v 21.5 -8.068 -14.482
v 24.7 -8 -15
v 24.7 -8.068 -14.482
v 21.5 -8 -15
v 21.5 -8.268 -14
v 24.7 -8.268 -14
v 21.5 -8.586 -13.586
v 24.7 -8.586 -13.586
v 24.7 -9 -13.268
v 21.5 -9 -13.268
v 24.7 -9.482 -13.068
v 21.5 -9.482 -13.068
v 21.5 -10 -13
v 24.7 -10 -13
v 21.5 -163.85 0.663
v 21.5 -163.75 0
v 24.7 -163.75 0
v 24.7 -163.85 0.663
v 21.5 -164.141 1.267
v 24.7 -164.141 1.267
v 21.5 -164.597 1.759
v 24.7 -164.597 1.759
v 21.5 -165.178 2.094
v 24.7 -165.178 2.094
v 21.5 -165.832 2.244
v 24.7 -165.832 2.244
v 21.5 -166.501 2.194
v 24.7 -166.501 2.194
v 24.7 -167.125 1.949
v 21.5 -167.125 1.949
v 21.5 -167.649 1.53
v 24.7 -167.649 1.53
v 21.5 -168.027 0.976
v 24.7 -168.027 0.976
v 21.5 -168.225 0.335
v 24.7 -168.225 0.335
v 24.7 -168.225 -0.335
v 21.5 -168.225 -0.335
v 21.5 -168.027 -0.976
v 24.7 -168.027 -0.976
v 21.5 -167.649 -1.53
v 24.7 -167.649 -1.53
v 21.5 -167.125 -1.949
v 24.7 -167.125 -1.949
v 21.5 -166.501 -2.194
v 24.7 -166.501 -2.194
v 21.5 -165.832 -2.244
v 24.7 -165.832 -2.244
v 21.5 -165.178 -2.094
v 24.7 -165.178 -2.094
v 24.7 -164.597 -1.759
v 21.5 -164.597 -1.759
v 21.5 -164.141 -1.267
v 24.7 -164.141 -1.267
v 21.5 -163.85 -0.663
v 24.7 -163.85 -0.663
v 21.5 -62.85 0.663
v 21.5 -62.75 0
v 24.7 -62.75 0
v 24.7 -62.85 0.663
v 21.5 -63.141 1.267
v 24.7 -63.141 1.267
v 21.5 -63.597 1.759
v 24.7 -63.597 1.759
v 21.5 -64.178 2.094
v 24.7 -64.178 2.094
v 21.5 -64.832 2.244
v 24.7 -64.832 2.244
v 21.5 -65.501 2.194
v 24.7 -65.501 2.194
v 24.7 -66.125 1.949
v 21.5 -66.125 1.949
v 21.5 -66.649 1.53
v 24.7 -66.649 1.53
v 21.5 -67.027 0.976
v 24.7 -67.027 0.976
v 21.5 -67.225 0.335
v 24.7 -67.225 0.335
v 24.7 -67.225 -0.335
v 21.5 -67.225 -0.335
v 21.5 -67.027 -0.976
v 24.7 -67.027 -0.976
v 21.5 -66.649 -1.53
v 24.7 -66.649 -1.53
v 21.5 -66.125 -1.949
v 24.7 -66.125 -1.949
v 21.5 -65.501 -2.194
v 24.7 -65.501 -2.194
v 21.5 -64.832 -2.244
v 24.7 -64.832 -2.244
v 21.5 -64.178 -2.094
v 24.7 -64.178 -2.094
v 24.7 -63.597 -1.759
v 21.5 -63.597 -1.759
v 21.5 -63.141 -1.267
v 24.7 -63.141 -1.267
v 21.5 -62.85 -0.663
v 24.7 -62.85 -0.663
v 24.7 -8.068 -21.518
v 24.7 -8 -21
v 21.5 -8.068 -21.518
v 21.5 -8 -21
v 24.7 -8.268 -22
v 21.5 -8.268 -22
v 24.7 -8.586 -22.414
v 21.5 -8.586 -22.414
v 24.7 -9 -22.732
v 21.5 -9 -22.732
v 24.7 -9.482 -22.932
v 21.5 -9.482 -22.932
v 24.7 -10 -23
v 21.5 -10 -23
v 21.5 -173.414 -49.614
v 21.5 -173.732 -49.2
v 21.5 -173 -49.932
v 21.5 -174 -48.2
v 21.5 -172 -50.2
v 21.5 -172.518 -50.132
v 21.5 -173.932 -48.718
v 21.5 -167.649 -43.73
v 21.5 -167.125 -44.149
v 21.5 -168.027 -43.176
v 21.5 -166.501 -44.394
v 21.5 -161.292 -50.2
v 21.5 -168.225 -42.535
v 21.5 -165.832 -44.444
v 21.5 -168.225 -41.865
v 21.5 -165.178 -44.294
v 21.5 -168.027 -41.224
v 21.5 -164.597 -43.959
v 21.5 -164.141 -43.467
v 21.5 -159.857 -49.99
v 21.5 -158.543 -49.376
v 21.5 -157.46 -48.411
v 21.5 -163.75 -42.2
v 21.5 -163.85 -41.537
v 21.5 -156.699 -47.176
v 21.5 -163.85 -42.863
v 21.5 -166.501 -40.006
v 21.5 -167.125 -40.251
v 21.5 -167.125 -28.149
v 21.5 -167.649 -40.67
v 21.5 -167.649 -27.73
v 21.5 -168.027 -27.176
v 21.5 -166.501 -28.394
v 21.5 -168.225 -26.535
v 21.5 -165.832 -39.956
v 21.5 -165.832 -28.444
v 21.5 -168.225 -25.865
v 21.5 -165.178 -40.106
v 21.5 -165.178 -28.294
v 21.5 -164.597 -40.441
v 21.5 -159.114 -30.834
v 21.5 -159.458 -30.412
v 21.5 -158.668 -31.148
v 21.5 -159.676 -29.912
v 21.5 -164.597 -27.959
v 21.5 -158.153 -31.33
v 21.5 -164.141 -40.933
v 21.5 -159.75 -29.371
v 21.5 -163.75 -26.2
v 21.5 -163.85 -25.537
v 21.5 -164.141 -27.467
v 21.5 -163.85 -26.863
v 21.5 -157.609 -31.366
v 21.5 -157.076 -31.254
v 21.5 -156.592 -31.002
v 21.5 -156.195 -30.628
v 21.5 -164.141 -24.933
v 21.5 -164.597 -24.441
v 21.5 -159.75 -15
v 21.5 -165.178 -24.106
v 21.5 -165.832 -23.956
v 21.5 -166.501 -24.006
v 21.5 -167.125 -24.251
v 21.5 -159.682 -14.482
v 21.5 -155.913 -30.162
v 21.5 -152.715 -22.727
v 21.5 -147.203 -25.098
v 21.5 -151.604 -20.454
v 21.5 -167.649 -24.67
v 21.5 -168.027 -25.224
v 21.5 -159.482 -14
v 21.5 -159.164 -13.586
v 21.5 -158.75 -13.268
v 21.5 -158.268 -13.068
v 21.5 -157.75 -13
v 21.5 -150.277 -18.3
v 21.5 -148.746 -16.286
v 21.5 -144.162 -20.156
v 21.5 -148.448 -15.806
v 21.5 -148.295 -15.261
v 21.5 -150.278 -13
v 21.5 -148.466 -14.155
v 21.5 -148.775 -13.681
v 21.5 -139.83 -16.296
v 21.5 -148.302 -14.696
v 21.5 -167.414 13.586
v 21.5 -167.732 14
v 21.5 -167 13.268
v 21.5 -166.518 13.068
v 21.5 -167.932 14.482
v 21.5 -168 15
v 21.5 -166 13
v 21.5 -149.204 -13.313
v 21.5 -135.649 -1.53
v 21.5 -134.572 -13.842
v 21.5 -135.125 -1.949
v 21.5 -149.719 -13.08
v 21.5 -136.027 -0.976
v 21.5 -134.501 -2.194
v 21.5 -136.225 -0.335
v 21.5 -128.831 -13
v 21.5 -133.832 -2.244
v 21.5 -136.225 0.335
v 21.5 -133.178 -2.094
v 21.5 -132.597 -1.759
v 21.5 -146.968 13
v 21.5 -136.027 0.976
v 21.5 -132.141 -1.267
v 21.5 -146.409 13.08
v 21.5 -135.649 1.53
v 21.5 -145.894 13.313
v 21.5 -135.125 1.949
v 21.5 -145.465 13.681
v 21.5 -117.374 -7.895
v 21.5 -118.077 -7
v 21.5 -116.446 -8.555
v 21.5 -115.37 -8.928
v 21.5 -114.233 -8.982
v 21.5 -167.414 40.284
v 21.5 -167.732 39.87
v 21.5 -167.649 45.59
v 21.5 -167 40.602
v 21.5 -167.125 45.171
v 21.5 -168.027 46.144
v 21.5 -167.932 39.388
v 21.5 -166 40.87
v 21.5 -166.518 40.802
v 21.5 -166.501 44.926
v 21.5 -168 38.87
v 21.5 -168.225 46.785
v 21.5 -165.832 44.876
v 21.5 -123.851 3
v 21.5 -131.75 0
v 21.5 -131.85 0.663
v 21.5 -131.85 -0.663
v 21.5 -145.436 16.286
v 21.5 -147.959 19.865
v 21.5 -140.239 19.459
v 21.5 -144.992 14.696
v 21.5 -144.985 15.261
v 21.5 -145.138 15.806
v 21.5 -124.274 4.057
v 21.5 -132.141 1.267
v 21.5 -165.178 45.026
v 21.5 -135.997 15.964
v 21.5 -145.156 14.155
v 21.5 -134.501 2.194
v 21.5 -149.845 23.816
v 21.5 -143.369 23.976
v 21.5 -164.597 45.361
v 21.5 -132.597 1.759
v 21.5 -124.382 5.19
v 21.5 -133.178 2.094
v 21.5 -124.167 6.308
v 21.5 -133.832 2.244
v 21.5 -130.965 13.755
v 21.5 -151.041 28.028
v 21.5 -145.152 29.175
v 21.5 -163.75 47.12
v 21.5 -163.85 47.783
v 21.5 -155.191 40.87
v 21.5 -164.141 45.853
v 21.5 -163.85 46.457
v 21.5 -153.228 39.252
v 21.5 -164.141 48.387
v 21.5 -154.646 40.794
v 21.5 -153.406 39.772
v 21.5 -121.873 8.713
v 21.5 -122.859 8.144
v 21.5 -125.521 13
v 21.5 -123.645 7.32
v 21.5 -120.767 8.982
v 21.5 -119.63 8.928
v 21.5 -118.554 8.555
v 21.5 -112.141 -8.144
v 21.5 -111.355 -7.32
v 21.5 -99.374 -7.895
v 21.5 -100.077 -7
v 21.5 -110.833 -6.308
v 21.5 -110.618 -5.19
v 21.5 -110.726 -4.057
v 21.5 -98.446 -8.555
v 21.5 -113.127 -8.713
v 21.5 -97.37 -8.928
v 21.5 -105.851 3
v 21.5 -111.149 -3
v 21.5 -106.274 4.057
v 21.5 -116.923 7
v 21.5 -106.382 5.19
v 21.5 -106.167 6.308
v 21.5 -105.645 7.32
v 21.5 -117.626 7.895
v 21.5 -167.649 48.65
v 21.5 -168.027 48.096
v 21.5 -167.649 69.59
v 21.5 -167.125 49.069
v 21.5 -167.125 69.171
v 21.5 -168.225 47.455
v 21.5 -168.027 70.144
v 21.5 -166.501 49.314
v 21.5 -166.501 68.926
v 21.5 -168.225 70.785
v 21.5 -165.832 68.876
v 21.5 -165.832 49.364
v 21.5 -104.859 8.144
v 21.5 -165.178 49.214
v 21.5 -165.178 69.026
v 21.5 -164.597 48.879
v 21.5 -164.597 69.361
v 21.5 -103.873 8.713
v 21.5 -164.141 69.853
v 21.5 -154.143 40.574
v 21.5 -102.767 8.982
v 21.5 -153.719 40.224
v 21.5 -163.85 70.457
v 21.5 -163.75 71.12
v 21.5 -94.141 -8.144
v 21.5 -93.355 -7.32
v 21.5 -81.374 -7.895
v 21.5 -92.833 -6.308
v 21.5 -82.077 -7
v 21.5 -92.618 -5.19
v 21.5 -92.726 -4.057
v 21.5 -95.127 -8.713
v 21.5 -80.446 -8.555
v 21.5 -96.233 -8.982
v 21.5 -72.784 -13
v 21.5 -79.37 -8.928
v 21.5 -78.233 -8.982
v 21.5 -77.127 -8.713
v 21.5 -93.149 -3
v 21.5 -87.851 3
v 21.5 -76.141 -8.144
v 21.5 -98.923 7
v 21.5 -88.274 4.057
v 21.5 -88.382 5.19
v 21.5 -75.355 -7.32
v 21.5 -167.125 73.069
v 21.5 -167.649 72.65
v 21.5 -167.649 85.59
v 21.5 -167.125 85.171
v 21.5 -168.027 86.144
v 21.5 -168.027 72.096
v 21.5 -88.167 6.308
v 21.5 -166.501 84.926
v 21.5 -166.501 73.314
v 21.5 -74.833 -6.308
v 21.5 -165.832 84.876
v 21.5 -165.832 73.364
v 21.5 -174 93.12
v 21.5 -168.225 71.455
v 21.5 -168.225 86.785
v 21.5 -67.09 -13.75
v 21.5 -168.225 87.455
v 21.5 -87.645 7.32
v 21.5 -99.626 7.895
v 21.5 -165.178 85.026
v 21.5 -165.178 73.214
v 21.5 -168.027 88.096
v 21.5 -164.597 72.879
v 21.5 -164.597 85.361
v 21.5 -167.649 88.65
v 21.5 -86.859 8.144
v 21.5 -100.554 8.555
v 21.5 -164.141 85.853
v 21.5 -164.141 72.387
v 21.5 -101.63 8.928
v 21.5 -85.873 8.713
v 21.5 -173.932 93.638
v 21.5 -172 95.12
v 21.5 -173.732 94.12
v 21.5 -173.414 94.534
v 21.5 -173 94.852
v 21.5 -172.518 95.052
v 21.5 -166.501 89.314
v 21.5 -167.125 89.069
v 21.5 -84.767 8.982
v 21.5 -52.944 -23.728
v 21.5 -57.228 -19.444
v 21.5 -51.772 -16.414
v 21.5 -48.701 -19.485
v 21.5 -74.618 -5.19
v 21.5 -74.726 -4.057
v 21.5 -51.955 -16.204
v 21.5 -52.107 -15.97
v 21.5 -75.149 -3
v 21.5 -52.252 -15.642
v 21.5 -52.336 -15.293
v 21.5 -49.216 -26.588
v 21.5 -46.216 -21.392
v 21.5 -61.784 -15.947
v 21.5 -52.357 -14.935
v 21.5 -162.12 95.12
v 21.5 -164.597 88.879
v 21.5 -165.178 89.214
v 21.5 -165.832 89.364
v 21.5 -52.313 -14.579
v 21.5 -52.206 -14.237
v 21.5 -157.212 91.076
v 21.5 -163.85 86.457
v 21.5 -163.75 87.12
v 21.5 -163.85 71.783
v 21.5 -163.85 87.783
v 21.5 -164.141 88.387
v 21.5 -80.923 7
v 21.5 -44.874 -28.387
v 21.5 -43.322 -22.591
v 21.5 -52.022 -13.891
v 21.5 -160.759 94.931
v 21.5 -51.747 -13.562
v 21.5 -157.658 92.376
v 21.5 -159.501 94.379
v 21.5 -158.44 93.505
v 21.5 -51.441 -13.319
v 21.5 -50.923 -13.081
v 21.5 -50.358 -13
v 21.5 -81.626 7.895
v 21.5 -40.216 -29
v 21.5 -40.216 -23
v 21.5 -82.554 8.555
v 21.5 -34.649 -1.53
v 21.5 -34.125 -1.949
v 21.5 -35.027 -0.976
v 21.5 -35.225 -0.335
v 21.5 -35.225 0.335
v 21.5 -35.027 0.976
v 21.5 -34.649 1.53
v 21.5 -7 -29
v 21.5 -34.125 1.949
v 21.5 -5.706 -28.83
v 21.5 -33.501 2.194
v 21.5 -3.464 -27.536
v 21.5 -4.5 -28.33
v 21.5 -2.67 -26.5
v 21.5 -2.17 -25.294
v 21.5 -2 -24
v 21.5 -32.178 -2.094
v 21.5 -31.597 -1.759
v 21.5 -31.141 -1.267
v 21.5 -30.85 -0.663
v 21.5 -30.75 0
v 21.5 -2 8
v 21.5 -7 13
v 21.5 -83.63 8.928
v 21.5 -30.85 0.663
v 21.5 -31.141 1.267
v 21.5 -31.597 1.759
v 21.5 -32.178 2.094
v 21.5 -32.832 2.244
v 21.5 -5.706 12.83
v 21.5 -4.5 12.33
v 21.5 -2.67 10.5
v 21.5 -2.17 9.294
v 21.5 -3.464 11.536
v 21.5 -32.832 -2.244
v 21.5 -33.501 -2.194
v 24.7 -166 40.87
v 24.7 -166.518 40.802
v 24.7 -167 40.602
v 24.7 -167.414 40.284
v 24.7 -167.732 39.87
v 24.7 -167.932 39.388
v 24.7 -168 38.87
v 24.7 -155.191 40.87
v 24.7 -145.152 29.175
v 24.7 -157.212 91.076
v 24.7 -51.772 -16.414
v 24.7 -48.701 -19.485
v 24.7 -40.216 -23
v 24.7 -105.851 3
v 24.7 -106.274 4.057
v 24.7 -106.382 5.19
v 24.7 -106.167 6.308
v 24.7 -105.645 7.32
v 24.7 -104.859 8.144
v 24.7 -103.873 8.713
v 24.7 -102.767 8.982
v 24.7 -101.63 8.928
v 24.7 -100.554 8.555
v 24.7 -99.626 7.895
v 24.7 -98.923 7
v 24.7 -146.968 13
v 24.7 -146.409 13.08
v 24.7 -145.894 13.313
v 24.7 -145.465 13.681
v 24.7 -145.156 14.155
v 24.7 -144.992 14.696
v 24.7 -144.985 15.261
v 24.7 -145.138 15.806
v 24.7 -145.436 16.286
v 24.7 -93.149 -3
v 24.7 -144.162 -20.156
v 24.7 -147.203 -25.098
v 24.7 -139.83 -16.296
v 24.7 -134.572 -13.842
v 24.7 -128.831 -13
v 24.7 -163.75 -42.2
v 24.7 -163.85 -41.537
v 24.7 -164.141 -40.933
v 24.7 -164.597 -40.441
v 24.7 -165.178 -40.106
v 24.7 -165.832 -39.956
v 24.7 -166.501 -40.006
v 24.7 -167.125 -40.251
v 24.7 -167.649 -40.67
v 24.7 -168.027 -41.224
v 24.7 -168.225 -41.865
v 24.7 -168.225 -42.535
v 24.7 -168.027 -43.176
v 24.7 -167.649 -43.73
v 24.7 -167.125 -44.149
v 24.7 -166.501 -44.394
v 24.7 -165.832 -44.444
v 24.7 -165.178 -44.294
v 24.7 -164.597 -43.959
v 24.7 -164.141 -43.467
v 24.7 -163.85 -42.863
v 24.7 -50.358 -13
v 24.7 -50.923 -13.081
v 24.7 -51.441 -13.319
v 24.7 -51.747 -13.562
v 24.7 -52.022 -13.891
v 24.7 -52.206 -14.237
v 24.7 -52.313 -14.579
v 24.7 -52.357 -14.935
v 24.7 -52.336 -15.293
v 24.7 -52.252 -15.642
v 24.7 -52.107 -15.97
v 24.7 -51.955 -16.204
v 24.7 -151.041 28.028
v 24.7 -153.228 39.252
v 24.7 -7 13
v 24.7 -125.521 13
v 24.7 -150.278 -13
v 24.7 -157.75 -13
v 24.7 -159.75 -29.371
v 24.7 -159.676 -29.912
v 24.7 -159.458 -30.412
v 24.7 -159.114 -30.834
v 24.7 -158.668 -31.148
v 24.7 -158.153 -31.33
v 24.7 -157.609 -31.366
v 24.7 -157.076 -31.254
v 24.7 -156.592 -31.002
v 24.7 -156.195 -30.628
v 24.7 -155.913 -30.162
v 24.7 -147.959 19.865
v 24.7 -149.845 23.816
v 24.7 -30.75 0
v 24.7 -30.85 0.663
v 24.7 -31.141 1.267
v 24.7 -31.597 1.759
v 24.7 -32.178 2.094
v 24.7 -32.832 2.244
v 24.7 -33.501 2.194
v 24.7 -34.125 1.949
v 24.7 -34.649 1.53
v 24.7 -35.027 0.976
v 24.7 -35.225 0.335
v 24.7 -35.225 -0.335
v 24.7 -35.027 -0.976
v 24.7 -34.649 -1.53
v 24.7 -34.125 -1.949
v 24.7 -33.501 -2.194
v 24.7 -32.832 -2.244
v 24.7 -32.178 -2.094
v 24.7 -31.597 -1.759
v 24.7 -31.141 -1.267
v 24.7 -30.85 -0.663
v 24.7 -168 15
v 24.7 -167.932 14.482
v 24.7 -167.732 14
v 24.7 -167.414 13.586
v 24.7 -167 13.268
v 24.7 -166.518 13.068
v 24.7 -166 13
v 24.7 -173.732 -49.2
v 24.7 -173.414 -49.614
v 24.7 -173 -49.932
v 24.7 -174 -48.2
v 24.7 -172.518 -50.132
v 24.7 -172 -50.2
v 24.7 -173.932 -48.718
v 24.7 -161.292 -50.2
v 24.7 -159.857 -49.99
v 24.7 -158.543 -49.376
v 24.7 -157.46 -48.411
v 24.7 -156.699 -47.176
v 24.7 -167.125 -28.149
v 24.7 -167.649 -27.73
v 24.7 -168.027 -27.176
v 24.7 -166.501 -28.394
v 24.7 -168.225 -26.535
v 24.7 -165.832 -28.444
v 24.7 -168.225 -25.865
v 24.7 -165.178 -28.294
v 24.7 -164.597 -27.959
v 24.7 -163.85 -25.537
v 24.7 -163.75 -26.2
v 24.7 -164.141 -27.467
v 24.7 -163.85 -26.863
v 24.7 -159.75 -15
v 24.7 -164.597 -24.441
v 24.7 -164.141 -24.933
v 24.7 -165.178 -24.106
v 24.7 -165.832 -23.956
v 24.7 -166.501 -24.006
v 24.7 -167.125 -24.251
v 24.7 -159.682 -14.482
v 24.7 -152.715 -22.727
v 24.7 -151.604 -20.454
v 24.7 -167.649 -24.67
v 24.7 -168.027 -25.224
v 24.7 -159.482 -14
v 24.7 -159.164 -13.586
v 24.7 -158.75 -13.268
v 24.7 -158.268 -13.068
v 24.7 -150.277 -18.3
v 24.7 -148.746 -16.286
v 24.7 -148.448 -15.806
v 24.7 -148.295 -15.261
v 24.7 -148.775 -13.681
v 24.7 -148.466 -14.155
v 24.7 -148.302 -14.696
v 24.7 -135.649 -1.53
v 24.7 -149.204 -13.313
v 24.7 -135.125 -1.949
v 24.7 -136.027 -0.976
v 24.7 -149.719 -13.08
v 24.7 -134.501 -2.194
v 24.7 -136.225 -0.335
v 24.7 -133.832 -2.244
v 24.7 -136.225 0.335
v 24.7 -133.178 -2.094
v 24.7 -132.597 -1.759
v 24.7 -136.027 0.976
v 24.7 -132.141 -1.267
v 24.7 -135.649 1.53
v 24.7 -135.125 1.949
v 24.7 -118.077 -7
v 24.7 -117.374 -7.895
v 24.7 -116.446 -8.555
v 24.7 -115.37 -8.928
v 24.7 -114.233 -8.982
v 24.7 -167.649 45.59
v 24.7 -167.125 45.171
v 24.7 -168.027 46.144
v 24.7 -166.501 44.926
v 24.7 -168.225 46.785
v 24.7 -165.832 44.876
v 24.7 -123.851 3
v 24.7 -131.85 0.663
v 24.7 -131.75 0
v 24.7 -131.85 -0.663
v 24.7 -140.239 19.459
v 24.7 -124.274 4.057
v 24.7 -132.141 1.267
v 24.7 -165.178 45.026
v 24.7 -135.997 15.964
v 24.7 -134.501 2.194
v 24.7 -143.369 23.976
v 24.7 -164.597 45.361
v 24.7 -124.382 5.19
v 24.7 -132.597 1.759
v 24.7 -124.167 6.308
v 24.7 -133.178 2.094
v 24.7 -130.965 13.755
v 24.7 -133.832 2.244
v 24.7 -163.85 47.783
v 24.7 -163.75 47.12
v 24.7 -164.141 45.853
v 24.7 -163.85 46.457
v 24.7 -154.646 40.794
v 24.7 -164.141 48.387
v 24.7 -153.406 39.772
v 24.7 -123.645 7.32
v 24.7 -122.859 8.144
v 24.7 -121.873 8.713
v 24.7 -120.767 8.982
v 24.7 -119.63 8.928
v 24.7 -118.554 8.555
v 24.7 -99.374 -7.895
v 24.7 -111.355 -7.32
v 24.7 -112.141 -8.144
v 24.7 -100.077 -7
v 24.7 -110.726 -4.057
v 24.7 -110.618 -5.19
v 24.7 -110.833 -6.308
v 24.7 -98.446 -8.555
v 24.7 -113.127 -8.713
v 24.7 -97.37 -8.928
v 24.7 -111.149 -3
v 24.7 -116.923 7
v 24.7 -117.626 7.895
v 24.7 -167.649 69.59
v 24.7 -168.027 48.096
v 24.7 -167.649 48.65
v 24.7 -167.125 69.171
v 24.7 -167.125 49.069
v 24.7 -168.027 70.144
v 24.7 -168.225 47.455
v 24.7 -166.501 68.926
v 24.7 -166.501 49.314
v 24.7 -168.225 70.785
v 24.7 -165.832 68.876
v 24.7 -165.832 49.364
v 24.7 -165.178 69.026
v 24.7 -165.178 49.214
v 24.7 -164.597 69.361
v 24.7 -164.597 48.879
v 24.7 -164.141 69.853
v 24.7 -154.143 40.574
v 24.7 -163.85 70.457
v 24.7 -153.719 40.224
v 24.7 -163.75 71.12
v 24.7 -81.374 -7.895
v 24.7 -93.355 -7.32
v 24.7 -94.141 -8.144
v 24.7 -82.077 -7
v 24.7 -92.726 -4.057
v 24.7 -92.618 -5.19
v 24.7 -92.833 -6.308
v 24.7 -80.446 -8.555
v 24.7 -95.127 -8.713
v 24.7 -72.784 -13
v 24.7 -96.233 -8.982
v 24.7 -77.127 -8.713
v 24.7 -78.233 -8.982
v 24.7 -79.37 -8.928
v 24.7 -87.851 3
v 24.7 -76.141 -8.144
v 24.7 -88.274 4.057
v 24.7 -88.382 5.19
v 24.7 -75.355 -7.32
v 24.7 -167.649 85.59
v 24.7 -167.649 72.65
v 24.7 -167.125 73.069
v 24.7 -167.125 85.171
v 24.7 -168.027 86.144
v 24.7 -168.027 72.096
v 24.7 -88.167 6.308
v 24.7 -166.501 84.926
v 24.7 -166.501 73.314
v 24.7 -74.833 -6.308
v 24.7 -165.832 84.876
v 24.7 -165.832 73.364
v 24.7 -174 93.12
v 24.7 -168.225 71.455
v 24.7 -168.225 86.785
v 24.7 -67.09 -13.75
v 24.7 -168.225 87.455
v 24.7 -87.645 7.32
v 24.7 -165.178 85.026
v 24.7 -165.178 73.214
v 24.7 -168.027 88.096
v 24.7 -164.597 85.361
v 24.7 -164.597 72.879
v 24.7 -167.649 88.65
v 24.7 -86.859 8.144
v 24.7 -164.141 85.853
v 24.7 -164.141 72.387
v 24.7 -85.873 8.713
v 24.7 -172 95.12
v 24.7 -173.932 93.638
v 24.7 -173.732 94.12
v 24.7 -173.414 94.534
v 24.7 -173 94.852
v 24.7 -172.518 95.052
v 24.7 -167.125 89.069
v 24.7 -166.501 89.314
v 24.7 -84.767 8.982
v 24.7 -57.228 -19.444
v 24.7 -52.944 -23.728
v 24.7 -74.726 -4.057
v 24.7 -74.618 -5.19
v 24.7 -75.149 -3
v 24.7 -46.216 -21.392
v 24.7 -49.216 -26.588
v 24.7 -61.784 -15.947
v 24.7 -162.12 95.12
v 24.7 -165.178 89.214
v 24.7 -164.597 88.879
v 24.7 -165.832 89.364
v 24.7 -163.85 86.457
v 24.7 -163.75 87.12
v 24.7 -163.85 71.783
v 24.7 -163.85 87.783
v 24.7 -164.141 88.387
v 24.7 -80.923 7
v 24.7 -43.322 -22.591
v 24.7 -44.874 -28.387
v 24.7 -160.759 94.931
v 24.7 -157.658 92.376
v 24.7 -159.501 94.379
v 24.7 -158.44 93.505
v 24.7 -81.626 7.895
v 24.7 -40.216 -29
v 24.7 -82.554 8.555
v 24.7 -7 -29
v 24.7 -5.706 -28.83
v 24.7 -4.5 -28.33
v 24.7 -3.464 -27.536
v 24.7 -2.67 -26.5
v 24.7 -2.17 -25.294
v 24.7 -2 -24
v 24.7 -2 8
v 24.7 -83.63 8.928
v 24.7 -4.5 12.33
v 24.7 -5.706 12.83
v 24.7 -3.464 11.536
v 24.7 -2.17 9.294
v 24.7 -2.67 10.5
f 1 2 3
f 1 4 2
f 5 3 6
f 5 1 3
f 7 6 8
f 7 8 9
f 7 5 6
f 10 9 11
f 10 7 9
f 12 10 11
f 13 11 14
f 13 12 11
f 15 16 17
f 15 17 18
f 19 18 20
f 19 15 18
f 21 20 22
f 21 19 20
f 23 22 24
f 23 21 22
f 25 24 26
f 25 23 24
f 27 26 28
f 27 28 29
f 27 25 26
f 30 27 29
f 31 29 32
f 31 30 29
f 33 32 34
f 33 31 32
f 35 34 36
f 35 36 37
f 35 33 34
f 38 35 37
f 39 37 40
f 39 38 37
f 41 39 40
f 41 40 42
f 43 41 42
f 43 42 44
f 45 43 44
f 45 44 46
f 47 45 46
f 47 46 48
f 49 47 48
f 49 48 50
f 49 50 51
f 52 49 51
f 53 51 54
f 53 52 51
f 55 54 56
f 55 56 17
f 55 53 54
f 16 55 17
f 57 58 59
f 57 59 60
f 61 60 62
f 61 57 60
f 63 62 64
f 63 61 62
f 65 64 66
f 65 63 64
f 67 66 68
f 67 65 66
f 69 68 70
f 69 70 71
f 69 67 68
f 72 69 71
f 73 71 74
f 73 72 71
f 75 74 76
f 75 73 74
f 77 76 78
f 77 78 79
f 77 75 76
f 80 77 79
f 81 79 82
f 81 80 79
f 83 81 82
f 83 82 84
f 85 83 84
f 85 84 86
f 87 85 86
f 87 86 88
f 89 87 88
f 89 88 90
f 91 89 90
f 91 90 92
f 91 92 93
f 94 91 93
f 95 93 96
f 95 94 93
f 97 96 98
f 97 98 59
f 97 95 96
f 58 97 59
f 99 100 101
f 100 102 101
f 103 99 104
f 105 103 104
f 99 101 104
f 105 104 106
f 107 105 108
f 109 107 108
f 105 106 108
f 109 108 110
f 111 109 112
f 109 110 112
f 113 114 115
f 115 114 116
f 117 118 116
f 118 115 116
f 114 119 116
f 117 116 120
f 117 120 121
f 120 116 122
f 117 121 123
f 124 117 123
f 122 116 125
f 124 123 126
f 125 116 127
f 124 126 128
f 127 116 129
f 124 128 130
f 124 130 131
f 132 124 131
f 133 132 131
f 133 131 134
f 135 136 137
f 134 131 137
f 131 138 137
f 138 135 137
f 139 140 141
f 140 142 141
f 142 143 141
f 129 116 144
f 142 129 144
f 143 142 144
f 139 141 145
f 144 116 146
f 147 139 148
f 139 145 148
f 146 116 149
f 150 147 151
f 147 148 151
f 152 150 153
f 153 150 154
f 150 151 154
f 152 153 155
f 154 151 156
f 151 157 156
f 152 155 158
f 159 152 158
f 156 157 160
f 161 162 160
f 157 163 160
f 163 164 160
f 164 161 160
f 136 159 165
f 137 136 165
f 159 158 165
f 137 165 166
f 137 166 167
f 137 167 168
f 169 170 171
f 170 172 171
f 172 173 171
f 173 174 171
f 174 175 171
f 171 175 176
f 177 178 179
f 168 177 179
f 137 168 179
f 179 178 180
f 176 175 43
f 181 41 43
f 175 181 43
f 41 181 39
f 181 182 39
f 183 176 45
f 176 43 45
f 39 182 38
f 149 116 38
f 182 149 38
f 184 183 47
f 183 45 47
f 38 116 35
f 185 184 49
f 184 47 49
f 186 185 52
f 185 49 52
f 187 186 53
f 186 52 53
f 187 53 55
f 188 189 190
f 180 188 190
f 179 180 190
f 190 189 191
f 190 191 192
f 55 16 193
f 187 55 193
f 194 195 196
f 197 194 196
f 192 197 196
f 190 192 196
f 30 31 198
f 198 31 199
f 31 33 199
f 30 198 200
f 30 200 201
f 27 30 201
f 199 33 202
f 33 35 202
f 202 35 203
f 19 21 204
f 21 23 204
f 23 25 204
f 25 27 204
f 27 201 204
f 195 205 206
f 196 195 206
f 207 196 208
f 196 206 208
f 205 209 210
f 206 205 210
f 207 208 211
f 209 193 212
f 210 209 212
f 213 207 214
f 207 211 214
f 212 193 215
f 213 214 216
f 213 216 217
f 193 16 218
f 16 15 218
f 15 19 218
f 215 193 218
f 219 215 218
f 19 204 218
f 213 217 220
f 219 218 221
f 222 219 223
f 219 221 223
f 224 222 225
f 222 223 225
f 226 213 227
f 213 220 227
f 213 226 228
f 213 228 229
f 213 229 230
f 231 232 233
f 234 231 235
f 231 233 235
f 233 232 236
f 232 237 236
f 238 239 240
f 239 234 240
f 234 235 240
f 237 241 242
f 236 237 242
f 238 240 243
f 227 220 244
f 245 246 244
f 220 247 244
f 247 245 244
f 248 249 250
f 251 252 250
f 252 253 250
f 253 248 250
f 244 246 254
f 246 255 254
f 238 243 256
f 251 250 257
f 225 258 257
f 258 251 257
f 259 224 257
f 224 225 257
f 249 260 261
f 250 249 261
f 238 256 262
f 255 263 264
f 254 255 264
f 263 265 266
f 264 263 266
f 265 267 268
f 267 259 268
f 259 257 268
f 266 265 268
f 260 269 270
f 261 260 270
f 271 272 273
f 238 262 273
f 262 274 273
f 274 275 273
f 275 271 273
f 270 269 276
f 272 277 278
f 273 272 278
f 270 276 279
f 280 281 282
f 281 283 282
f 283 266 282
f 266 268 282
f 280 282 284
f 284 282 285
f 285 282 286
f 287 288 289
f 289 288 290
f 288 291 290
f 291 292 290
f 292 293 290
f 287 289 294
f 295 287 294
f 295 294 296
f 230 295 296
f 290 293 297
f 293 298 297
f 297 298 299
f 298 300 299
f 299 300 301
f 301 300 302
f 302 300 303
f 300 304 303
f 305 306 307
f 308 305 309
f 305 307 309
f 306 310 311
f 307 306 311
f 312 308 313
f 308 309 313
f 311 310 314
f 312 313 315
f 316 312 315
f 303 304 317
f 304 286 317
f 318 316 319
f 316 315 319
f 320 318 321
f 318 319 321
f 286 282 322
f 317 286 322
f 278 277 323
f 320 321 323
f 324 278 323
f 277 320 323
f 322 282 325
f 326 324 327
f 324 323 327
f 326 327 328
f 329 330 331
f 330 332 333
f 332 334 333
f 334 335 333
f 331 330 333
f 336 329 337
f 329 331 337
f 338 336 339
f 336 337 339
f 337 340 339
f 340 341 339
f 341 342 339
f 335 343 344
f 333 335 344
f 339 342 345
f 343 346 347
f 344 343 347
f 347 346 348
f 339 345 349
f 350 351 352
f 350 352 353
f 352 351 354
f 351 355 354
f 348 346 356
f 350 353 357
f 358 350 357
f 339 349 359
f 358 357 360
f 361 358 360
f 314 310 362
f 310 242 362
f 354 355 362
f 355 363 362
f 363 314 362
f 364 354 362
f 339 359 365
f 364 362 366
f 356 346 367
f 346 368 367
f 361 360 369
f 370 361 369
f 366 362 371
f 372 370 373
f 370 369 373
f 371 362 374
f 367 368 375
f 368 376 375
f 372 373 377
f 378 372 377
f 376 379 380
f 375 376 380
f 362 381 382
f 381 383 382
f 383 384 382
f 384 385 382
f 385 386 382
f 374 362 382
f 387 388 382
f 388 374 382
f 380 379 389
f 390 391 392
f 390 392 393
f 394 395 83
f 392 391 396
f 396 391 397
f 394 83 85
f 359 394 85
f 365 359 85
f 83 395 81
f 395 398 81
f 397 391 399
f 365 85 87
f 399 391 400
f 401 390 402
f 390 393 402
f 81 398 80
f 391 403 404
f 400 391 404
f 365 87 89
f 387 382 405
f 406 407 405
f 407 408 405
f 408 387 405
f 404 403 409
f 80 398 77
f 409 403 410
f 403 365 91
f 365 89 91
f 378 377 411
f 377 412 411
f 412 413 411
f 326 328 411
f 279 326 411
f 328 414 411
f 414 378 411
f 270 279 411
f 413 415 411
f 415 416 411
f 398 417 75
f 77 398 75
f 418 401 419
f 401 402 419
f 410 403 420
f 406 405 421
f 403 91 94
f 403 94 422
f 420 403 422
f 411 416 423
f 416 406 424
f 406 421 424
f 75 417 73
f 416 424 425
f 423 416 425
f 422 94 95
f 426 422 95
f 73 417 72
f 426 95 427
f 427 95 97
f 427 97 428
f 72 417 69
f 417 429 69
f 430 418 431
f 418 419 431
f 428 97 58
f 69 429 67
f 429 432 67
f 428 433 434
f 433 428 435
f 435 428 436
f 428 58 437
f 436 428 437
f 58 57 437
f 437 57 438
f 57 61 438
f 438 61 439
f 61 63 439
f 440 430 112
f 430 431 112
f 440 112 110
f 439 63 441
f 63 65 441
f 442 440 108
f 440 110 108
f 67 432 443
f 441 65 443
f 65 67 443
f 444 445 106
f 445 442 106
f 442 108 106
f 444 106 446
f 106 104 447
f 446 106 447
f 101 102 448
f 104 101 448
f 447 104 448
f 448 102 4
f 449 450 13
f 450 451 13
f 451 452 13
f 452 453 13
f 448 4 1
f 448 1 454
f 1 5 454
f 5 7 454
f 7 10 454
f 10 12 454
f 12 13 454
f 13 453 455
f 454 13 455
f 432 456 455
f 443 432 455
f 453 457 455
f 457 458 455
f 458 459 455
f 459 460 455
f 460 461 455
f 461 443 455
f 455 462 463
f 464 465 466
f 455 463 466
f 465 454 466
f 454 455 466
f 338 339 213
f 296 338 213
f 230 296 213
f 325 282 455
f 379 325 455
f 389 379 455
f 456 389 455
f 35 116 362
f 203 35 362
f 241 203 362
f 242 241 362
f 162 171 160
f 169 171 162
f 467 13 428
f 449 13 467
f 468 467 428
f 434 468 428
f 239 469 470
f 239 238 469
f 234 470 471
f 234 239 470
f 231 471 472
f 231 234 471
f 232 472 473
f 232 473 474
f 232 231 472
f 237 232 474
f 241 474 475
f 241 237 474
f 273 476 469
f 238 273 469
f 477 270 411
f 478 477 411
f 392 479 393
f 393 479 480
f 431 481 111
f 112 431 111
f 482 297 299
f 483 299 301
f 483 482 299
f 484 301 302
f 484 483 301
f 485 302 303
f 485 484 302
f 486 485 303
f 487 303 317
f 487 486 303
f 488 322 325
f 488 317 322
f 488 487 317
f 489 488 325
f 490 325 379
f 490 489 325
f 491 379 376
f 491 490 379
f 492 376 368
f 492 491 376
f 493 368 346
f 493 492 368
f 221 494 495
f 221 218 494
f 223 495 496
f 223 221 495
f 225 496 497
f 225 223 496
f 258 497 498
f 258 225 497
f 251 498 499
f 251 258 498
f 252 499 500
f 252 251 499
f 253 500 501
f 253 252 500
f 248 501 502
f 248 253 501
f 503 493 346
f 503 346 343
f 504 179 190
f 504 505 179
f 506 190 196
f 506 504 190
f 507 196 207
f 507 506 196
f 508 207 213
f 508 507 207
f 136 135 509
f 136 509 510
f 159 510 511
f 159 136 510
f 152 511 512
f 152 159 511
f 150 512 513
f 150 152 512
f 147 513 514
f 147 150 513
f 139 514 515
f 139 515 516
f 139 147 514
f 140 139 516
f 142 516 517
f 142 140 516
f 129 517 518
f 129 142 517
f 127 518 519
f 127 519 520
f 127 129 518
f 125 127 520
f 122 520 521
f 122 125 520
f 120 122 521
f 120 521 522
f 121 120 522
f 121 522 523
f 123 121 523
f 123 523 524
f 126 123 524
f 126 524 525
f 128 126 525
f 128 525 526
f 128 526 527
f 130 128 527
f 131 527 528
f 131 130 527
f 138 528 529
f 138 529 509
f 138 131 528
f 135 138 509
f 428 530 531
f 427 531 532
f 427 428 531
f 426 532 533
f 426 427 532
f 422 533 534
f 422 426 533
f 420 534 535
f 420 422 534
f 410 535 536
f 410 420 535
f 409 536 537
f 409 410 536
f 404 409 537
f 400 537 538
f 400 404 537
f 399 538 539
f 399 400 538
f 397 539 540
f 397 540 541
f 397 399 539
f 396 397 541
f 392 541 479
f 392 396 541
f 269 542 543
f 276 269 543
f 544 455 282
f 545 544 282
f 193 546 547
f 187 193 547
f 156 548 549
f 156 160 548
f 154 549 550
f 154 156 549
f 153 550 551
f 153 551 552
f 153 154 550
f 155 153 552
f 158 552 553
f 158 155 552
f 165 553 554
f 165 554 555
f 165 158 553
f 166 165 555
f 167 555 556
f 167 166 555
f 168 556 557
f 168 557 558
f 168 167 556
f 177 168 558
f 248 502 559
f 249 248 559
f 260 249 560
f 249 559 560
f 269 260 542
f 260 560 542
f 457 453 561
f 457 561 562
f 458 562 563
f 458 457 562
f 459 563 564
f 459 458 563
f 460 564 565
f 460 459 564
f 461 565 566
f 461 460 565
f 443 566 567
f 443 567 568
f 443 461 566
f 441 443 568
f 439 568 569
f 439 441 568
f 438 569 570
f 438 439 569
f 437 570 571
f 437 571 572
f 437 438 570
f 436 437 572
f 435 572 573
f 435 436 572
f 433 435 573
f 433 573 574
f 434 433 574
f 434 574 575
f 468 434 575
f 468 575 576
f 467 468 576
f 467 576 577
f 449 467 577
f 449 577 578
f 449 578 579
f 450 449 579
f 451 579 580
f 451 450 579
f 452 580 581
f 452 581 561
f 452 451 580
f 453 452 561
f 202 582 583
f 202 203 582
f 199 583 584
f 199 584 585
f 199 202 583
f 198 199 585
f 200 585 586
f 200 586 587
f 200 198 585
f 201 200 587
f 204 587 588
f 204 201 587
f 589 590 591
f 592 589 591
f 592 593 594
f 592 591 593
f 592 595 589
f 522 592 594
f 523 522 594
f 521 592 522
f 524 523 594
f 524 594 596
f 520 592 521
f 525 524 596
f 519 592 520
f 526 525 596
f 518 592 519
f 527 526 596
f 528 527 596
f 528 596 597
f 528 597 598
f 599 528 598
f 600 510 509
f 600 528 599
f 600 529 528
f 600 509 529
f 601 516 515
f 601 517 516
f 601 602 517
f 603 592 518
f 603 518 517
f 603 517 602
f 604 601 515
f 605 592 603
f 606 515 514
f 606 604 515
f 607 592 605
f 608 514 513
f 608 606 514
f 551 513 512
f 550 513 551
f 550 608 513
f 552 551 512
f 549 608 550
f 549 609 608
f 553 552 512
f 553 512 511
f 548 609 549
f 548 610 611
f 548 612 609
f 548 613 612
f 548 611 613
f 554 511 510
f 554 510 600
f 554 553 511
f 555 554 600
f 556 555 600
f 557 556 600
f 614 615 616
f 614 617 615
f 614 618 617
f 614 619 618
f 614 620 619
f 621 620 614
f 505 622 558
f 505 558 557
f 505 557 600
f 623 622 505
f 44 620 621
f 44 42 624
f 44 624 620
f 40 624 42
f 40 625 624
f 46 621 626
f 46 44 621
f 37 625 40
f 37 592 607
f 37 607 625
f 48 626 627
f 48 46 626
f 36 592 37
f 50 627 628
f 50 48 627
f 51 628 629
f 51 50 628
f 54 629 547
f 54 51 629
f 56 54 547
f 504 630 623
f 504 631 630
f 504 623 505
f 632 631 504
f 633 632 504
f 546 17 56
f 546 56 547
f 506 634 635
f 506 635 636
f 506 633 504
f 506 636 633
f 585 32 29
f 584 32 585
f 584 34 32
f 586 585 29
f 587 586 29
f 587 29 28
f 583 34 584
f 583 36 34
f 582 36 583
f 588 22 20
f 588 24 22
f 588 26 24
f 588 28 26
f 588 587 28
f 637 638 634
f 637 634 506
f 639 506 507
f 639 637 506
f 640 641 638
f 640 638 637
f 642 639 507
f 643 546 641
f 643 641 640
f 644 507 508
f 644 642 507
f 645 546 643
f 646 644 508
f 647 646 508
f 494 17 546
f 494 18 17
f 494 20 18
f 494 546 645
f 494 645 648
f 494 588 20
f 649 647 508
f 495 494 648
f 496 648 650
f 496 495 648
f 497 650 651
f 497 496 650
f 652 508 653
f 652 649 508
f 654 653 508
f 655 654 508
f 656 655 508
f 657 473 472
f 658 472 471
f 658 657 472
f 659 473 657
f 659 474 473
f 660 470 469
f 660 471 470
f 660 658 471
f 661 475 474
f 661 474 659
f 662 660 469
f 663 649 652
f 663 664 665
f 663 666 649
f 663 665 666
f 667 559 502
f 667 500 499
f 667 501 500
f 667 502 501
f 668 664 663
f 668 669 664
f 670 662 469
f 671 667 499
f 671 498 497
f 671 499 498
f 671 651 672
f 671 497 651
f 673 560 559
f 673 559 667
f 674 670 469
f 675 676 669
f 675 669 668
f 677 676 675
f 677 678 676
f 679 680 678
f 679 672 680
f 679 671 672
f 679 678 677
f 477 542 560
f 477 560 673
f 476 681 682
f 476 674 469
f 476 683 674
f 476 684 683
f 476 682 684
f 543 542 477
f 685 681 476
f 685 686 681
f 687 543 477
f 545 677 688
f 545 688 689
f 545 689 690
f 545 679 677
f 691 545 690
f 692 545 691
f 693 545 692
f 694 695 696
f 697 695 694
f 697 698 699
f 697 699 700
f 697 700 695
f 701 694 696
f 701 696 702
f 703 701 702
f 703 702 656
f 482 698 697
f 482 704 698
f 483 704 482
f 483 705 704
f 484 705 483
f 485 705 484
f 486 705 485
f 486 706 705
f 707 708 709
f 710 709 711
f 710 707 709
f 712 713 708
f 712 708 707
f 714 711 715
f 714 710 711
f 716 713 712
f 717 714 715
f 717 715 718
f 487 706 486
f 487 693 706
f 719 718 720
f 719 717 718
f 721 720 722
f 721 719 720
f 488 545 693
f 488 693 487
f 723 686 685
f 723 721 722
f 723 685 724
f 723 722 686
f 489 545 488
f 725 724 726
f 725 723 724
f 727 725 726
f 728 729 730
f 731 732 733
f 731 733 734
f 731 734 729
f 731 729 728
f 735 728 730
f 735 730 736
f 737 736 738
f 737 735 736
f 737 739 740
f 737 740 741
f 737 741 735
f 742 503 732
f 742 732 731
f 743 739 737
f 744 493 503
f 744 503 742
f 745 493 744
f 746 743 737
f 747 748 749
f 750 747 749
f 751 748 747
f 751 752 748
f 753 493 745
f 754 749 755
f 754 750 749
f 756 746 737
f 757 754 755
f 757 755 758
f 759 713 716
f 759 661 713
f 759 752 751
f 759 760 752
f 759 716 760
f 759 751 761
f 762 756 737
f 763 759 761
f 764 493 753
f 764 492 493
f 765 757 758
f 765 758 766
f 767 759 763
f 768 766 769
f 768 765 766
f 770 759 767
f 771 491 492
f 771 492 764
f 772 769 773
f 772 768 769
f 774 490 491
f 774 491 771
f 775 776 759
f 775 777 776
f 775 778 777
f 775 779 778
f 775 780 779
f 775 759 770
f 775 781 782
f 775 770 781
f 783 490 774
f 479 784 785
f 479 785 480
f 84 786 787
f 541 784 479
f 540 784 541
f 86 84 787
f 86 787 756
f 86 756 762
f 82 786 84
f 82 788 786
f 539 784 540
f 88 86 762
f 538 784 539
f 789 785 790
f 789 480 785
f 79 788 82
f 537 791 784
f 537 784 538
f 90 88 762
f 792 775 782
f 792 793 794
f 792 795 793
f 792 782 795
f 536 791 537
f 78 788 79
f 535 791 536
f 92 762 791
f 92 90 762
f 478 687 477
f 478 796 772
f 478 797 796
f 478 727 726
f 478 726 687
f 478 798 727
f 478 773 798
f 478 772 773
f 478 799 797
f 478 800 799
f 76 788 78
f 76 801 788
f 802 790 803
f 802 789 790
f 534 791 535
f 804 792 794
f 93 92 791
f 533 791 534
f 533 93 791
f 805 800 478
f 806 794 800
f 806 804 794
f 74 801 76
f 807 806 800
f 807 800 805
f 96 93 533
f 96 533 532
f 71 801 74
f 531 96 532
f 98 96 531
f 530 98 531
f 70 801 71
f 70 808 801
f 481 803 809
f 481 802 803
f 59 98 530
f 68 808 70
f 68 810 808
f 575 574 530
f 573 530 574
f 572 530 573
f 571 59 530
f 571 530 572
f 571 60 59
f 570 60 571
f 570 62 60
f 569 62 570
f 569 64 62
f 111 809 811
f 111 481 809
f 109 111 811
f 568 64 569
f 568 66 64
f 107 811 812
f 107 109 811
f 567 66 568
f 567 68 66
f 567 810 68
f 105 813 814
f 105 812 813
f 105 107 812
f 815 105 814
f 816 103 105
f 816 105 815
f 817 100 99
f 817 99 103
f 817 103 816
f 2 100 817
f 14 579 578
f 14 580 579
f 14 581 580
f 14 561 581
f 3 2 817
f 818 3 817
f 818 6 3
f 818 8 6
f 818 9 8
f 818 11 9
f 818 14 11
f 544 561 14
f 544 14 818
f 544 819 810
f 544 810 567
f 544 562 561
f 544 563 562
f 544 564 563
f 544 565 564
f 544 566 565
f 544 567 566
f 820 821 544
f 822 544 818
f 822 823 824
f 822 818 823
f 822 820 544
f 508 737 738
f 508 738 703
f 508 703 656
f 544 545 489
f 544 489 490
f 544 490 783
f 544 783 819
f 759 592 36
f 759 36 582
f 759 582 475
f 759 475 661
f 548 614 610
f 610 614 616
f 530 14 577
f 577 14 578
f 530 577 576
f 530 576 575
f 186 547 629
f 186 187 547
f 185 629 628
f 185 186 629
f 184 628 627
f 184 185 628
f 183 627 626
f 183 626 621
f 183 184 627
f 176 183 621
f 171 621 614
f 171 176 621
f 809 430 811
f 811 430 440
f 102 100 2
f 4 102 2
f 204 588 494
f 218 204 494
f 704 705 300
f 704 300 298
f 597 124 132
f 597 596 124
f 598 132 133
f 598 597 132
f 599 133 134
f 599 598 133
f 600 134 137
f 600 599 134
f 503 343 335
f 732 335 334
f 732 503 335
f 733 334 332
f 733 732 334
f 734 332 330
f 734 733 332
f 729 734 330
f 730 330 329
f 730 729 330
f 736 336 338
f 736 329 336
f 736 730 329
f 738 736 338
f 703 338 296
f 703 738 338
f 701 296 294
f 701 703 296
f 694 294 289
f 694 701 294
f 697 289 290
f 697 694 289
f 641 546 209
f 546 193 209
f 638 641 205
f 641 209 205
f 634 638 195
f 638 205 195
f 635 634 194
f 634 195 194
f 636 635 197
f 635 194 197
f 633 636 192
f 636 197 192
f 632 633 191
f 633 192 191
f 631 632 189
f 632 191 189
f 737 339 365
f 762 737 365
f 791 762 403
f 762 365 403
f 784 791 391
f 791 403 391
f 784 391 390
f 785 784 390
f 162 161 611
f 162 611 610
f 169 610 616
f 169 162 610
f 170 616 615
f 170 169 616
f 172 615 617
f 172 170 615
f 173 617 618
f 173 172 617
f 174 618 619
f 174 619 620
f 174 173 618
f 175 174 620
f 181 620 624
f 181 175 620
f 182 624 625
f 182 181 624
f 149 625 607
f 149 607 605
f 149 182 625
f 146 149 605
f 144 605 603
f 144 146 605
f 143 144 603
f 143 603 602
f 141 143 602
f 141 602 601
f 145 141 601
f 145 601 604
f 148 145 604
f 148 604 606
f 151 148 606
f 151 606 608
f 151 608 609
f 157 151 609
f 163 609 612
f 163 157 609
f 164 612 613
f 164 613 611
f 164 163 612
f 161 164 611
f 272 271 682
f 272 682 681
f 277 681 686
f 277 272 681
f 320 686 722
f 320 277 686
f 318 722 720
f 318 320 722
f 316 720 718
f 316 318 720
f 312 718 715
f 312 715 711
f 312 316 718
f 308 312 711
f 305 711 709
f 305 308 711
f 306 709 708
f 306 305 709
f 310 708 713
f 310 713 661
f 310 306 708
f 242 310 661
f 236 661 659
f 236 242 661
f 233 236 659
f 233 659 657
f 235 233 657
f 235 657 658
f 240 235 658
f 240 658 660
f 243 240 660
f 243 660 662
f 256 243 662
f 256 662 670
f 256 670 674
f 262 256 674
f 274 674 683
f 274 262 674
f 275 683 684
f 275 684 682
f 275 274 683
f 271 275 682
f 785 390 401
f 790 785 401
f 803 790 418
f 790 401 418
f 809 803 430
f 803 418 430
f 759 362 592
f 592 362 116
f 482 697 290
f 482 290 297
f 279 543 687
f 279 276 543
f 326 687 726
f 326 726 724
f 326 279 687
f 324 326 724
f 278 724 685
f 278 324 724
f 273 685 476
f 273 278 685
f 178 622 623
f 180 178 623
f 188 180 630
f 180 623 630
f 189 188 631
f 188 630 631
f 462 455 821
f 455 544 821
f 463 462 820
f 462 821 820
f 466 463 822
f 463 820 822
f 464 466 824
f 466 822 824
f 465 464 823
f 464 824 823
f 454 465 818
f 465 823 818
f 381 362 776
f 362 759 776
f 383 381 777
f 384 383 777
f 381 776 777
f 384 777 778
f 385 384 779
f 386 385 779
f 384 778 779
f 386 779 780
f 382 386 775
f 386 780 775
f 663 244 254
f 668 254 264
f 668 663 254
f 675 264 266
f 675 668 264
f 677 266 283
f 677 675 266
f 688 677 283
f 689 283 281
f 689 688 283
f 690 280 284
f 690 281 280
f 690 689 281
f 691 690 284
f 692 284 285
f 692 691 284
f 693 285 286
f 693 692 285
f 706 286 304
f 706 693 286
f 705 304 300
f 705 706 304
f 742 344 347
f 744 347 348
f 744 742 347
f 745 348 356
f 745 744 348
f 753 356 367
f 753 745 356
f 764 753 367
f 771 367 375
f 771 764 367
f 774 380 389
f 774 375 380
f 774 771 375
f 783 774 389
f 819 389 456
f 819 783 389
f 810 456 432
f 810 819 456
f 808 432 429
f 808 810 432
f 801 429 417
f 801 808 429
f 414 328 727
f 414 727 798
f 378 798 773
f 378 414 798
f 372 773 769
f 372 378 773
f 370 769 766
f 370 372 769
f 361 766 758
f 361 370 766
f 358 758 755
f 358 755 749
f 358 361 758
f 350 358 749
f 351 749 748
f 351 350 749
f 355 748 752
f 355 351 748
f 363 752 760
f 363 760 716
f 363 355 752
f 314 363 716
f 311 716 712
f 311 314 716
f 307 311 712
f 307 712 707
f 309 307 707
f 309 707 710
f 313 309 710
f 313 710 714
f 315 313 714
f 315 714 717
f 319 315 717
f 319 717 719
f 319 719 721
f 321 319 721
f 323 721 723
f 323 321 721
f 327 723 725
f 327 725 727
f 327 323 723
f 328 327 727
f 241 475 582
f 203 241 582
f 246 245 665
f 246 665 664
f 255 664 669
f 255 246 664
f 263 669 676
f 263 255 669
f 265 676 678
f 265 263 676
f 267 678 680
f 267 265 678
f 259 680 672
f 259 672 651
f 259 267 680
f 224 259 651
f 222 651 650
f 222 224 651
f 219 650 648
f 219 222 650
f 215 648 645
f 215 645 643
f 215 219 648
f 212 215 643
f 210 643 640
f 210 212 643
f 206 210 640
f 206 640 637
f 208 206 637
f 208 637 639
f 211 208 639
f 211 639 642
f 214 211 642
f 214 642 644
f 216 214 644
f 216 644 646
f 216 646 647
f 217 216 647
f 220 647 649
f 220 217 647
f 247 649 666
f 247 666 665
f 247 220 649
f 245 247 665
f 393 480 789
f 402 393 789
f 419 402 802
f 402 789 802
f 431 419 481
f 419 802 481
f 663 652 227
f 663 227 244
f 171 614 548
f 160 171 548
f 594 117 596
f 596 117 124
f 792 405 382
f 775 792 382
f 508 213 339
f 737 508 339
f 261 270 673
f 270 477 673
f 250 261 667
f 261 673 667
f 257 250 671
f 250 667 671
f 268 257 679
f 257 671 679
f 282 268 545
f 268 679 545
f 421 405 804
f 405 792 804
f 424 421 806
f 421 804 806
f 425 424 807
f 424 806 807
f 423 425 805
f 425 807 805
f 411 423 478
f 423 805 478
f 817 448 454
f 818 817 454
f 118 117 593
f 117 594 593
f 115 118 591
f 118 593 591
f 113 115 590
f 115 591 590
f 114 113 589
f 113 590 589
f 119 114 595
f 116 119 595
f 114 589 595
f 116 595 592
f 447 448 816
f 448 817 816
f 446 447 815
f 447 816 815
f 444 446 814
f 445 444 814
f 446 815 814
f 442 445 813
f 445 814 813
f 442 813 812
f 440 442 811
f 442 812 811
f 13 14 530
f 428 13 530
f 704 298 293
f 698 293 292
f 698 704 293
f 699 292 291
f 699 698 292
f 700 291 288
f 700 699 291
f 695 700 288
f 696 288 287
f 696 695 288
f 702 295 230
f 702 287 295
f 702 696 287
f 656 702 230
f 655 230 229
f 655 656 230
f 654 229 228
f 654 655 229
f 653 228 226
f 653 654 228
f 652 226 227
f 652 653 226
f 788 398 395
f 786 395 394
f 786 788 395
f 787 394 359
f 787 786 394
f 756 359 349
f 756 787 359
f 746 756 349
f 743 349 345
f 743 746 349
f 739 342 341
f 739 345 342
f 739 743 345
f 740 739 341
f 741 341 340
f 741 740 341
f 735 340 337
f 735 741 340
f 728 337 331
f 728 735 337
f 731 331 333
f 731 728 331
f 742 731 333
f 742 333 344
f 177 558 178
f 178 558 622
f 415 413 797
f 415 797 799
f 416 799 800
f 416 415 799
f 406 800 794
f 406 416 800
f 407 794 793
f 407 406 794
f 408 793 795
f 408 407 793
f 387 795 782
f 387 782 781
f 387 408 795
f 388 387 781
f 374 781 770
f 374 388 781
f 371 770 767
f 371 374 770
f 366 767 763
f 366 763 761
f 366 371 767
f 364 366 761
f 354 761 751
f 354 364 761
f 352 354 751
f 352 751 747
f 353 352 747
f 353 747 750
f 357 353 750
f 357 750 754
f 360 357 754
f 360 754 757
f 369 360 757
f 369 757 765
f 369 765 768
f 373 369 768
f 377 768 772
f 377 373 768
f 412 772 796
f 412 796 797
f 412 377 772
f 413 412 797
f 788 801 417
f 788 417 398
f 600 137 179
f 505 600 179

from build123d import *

# Parameters (mm, degrees)
STOCK_SPINE_MASTER_1_START     = 21.5
STOCK_SPINE_MASTER_1_OUTLINE_R = 2.25
STOCK_SPINE_MASTER_1_DEPTH     = 3.2
FILLET1_R                      = 5
FILLET2_R                      = 2
FILLET3_R                      = 20
CUT_EXTRUDE4_DEPTH             = 199.32814828
FILLET4_R                      = 2
CUT_EXTRUDE6_DEPTH             = 199.328148417
LPATTERN2_COUNT                = 2
LPATTERN2_PITCH                = 18
LPATTERN2_COL_COUNT            = 2
LPATTERN2_COL_PITCH            = 18


# Read off the part's stored shape, not the designer's step: Stock-spine_master-1
with BuildPart() as part:
    # Stock-spine_master-1 outline → Stock-spine_master-1 (new body)
    with BuildSketch(Plane.YZ.offset(STOCK_SPINE_MASTER_1_START)):
        with BuildLine():
            Line((-174, -50.2), (-158, -50.2))
            Line((-158, -50.2), (-142, -13))
            Line((-142, -13), (-72.784271247, -13))
            ThreePointArc((-72.784271247, -13), (-64.365235735, -14.674650285), (-57.227922061, -19.443650814))
            Line((-57.227922061, -19.443650814), (-52.943650814, -23.727922061))
            ThreePointArc((-52.943650814, -23.727922061), (-47.104030535, -27.629831585), (-40.215728753, -29))
            Line((-40.215728753, -29), (-2, -29))
            Line((-2, -29), (-2, 13))
            Line((-2, 13), (-142, 13))
            Line((-142, 13), (-158, 95.12))
            Line((-158, 95.12), (-174, 95.12))
            Line((-174, 95.12), (-174, -50.2))
        make_face()
        with Locations((-166, -42.2)):
            Circle(STOCK_SPINE_MASTER_1_OUTLINE_R, mode=Mode.SUBTRACT)
        with Locations((-166, -26.2)):
            Circle(STOCK_SPINE_MASTER_1_OUTLINE_R, mode=Mode.SUBTRACT)
        with Locations((-166, 0)):
            Circle(STOCK_SPINE_MASTER_1_OUTLINE_R, mode=Mode.SUBTRACT)
        with Locations((-134, 0)):
            Circle(STOCK_SPINE_MASTER_1_OUTLINE_R, mode=Mode.SUBTRACT)
        with Locations((-65, 0)):
            Circle(STOCK_SPINE_MASTER_1_OUTLINE_R, mode=Mode.SUBTRACT)
        with Locations((-33, 0)):
            Circle(STOCK_SPINE_MASTER_1_OUTLINE_R, mode=Mode.SUBTRACT)
        with Locations((-166, 47.12)):
            Circle(STOCK_SPINE_MASTER_1_OUTLINE_R, mode=Mode.SUBTRACT)
        with Locations((-166, 71.12)):
            Circle(STOCK_SPINE_MASTER_1_OUTLINE_R, mode=Mode.SUBTRACT)
        with Locations((-166, 87.12)):
            Circle(STOCK_SPINE_MASTER_1_OUTLINE_R, mode=Mode.SUBTRACT)
    extrude(amount=STOCK_SPINE_MASTER_1_DEPTH)

    # Fillet1
    fillet1_edges = [part.edges().sort_by_distance(p)[0] for p in [
        (23.1, -158, 95.12),
        (23.1, -2, 13),
        (23.1, -2, -29),
        (23.1, -158, -50.2),
    ]]
    fillet(fillet1_edges, radius=FILLET1_R)

    # Fillet2
    fillet2_edges = [part.edges().sort_by_distance(p)[0] for p in [
        (23.1, -174, -50.2),
        (23.1, -174, 95.12),
    ]]
    fillet(fillet2_edges, radius=FILLET2_R)

    # Fillet3
    fillet3_edges = [part.edges().sort_by_distance(p)[0] for p in [
        (23.1, -142, 13),
        (23.1, -142, -13),
    ]]
    fillet(fillet3_edges, radius=FILLET3_R)

    # Sketch7 → Cut-Extrude4 (cut, through all)
    with BuildSketch(Plane(origin=(24.7, 0, 0), x_dir=(0, 0, -1), z_dir=(1, 0, 0))):
        with BuildLine():
            Line((-28.027740447, -151.040780627), (-40.87, -153.542925693))
            Line((-40.87, -153.542925693), (-40.87, -168))
            Line((-40.87, -168), (-13, -168))
            Line((-13, -168), (-13, -142.133906195))
            ThreePointArc((-13, -142.133906195), (-19.743434086, -147.887228617), (-28.027740447, -151.040780627))
        make_face()
        with BuildLine():
            Line((23, -8), (13, -8))
            Line((13, -8), (13, -55.463763172))
            ThreePointArc((13, -55.463763172), (14.063796748, -54.191923537), (15.201010127, -52.985281374))
            Line((15.201010127, -52.985281374), (19.485281374, -48.701010127))
            ThreePointArc((19.485281374, -48.701010127), (22.08655439, -44.807929941), (23, -40.215728753))
            Line((23, -40.215728753), (23, -8))
        make_face()
        with BuildLine():
            Line((13, -145.443926245), (13, -159.75))
            Line((13, -159.75), (39.083148267, -159.75))
            Line((39.083148267, -159.75), (22.727111066, -152.71514529))
            ThreePointArc((22.727111066, -152.71514529), (17.433060426, -149.655432834), (13, -145.443926245))
        make_face()
    extrude(amount=-CUT_EXTRUDE4_DEPTH, mode=Mode.SUBTRACT)

    # Fillet4
    fillet4_edges = [part.edges().sort_by_distance(p)[0] for p in [
        (23.1, -168, 13),
        (23.1, -168, 40.87),
        (23.1, -153.542925693, 40.87),
        (23.1, -142.133906195, 13),
        (23.1, -55.463763172, -13),
        (23.1, -145.443926245, -13),
        (23.1, -8, -13),
        (23.1, -159.75, -13),
        (23.1, -159.75, -39.083148267),
        (23.1, -8, -23),
    ]]
    fillet(fillet4_edges, radius=FILLET4_R)

    # Sketch10 → Cut-Extrude6 (cut, through all)
    with BuildSketch(Plane(origin=(24.7, 0, 0), x_dir=(0, 0, -1), z_dir=(1, 0, 0))):
        with BuildLine():
            Line((-7, -98.922649731), (3, -93.149147039))
            ThreePointArc((3, -93.149147039), (8.464101615, -94.613248654), (7, -100.077350269))
            Line((7, -100.077350269), (-3, -105.850852961))
            ThreePointArc((-3, -105.850852961), (-8.464101615, -104.386751346), (-7, -98.922649731))
        make_face()
    cut_extrude6 = extrude(amount=-CUT_EXTRUDE6_DEPTH, mode=Mode.SUBTRACT)

    # LPattern2: Cut-Extrude6 ×2
    with Locations(*[(0, i * LPATTERN2_PITCH, 0) for i in range(1, LPATTERN2_COUNT)]):
        add(cut_extrude6, mode=Mode.SUBTRACT)

    # LPattern2 col: Cut-Extrude6 ×2
    with Locations(*[(0, -i * LPATTERN2_COL_PITCH, 0) for i in range(1, LPATTERN2_COL_COUNT)]):
        add(cut_extrude6, mode=Mode.SUBTRACT)


solid = part.part
